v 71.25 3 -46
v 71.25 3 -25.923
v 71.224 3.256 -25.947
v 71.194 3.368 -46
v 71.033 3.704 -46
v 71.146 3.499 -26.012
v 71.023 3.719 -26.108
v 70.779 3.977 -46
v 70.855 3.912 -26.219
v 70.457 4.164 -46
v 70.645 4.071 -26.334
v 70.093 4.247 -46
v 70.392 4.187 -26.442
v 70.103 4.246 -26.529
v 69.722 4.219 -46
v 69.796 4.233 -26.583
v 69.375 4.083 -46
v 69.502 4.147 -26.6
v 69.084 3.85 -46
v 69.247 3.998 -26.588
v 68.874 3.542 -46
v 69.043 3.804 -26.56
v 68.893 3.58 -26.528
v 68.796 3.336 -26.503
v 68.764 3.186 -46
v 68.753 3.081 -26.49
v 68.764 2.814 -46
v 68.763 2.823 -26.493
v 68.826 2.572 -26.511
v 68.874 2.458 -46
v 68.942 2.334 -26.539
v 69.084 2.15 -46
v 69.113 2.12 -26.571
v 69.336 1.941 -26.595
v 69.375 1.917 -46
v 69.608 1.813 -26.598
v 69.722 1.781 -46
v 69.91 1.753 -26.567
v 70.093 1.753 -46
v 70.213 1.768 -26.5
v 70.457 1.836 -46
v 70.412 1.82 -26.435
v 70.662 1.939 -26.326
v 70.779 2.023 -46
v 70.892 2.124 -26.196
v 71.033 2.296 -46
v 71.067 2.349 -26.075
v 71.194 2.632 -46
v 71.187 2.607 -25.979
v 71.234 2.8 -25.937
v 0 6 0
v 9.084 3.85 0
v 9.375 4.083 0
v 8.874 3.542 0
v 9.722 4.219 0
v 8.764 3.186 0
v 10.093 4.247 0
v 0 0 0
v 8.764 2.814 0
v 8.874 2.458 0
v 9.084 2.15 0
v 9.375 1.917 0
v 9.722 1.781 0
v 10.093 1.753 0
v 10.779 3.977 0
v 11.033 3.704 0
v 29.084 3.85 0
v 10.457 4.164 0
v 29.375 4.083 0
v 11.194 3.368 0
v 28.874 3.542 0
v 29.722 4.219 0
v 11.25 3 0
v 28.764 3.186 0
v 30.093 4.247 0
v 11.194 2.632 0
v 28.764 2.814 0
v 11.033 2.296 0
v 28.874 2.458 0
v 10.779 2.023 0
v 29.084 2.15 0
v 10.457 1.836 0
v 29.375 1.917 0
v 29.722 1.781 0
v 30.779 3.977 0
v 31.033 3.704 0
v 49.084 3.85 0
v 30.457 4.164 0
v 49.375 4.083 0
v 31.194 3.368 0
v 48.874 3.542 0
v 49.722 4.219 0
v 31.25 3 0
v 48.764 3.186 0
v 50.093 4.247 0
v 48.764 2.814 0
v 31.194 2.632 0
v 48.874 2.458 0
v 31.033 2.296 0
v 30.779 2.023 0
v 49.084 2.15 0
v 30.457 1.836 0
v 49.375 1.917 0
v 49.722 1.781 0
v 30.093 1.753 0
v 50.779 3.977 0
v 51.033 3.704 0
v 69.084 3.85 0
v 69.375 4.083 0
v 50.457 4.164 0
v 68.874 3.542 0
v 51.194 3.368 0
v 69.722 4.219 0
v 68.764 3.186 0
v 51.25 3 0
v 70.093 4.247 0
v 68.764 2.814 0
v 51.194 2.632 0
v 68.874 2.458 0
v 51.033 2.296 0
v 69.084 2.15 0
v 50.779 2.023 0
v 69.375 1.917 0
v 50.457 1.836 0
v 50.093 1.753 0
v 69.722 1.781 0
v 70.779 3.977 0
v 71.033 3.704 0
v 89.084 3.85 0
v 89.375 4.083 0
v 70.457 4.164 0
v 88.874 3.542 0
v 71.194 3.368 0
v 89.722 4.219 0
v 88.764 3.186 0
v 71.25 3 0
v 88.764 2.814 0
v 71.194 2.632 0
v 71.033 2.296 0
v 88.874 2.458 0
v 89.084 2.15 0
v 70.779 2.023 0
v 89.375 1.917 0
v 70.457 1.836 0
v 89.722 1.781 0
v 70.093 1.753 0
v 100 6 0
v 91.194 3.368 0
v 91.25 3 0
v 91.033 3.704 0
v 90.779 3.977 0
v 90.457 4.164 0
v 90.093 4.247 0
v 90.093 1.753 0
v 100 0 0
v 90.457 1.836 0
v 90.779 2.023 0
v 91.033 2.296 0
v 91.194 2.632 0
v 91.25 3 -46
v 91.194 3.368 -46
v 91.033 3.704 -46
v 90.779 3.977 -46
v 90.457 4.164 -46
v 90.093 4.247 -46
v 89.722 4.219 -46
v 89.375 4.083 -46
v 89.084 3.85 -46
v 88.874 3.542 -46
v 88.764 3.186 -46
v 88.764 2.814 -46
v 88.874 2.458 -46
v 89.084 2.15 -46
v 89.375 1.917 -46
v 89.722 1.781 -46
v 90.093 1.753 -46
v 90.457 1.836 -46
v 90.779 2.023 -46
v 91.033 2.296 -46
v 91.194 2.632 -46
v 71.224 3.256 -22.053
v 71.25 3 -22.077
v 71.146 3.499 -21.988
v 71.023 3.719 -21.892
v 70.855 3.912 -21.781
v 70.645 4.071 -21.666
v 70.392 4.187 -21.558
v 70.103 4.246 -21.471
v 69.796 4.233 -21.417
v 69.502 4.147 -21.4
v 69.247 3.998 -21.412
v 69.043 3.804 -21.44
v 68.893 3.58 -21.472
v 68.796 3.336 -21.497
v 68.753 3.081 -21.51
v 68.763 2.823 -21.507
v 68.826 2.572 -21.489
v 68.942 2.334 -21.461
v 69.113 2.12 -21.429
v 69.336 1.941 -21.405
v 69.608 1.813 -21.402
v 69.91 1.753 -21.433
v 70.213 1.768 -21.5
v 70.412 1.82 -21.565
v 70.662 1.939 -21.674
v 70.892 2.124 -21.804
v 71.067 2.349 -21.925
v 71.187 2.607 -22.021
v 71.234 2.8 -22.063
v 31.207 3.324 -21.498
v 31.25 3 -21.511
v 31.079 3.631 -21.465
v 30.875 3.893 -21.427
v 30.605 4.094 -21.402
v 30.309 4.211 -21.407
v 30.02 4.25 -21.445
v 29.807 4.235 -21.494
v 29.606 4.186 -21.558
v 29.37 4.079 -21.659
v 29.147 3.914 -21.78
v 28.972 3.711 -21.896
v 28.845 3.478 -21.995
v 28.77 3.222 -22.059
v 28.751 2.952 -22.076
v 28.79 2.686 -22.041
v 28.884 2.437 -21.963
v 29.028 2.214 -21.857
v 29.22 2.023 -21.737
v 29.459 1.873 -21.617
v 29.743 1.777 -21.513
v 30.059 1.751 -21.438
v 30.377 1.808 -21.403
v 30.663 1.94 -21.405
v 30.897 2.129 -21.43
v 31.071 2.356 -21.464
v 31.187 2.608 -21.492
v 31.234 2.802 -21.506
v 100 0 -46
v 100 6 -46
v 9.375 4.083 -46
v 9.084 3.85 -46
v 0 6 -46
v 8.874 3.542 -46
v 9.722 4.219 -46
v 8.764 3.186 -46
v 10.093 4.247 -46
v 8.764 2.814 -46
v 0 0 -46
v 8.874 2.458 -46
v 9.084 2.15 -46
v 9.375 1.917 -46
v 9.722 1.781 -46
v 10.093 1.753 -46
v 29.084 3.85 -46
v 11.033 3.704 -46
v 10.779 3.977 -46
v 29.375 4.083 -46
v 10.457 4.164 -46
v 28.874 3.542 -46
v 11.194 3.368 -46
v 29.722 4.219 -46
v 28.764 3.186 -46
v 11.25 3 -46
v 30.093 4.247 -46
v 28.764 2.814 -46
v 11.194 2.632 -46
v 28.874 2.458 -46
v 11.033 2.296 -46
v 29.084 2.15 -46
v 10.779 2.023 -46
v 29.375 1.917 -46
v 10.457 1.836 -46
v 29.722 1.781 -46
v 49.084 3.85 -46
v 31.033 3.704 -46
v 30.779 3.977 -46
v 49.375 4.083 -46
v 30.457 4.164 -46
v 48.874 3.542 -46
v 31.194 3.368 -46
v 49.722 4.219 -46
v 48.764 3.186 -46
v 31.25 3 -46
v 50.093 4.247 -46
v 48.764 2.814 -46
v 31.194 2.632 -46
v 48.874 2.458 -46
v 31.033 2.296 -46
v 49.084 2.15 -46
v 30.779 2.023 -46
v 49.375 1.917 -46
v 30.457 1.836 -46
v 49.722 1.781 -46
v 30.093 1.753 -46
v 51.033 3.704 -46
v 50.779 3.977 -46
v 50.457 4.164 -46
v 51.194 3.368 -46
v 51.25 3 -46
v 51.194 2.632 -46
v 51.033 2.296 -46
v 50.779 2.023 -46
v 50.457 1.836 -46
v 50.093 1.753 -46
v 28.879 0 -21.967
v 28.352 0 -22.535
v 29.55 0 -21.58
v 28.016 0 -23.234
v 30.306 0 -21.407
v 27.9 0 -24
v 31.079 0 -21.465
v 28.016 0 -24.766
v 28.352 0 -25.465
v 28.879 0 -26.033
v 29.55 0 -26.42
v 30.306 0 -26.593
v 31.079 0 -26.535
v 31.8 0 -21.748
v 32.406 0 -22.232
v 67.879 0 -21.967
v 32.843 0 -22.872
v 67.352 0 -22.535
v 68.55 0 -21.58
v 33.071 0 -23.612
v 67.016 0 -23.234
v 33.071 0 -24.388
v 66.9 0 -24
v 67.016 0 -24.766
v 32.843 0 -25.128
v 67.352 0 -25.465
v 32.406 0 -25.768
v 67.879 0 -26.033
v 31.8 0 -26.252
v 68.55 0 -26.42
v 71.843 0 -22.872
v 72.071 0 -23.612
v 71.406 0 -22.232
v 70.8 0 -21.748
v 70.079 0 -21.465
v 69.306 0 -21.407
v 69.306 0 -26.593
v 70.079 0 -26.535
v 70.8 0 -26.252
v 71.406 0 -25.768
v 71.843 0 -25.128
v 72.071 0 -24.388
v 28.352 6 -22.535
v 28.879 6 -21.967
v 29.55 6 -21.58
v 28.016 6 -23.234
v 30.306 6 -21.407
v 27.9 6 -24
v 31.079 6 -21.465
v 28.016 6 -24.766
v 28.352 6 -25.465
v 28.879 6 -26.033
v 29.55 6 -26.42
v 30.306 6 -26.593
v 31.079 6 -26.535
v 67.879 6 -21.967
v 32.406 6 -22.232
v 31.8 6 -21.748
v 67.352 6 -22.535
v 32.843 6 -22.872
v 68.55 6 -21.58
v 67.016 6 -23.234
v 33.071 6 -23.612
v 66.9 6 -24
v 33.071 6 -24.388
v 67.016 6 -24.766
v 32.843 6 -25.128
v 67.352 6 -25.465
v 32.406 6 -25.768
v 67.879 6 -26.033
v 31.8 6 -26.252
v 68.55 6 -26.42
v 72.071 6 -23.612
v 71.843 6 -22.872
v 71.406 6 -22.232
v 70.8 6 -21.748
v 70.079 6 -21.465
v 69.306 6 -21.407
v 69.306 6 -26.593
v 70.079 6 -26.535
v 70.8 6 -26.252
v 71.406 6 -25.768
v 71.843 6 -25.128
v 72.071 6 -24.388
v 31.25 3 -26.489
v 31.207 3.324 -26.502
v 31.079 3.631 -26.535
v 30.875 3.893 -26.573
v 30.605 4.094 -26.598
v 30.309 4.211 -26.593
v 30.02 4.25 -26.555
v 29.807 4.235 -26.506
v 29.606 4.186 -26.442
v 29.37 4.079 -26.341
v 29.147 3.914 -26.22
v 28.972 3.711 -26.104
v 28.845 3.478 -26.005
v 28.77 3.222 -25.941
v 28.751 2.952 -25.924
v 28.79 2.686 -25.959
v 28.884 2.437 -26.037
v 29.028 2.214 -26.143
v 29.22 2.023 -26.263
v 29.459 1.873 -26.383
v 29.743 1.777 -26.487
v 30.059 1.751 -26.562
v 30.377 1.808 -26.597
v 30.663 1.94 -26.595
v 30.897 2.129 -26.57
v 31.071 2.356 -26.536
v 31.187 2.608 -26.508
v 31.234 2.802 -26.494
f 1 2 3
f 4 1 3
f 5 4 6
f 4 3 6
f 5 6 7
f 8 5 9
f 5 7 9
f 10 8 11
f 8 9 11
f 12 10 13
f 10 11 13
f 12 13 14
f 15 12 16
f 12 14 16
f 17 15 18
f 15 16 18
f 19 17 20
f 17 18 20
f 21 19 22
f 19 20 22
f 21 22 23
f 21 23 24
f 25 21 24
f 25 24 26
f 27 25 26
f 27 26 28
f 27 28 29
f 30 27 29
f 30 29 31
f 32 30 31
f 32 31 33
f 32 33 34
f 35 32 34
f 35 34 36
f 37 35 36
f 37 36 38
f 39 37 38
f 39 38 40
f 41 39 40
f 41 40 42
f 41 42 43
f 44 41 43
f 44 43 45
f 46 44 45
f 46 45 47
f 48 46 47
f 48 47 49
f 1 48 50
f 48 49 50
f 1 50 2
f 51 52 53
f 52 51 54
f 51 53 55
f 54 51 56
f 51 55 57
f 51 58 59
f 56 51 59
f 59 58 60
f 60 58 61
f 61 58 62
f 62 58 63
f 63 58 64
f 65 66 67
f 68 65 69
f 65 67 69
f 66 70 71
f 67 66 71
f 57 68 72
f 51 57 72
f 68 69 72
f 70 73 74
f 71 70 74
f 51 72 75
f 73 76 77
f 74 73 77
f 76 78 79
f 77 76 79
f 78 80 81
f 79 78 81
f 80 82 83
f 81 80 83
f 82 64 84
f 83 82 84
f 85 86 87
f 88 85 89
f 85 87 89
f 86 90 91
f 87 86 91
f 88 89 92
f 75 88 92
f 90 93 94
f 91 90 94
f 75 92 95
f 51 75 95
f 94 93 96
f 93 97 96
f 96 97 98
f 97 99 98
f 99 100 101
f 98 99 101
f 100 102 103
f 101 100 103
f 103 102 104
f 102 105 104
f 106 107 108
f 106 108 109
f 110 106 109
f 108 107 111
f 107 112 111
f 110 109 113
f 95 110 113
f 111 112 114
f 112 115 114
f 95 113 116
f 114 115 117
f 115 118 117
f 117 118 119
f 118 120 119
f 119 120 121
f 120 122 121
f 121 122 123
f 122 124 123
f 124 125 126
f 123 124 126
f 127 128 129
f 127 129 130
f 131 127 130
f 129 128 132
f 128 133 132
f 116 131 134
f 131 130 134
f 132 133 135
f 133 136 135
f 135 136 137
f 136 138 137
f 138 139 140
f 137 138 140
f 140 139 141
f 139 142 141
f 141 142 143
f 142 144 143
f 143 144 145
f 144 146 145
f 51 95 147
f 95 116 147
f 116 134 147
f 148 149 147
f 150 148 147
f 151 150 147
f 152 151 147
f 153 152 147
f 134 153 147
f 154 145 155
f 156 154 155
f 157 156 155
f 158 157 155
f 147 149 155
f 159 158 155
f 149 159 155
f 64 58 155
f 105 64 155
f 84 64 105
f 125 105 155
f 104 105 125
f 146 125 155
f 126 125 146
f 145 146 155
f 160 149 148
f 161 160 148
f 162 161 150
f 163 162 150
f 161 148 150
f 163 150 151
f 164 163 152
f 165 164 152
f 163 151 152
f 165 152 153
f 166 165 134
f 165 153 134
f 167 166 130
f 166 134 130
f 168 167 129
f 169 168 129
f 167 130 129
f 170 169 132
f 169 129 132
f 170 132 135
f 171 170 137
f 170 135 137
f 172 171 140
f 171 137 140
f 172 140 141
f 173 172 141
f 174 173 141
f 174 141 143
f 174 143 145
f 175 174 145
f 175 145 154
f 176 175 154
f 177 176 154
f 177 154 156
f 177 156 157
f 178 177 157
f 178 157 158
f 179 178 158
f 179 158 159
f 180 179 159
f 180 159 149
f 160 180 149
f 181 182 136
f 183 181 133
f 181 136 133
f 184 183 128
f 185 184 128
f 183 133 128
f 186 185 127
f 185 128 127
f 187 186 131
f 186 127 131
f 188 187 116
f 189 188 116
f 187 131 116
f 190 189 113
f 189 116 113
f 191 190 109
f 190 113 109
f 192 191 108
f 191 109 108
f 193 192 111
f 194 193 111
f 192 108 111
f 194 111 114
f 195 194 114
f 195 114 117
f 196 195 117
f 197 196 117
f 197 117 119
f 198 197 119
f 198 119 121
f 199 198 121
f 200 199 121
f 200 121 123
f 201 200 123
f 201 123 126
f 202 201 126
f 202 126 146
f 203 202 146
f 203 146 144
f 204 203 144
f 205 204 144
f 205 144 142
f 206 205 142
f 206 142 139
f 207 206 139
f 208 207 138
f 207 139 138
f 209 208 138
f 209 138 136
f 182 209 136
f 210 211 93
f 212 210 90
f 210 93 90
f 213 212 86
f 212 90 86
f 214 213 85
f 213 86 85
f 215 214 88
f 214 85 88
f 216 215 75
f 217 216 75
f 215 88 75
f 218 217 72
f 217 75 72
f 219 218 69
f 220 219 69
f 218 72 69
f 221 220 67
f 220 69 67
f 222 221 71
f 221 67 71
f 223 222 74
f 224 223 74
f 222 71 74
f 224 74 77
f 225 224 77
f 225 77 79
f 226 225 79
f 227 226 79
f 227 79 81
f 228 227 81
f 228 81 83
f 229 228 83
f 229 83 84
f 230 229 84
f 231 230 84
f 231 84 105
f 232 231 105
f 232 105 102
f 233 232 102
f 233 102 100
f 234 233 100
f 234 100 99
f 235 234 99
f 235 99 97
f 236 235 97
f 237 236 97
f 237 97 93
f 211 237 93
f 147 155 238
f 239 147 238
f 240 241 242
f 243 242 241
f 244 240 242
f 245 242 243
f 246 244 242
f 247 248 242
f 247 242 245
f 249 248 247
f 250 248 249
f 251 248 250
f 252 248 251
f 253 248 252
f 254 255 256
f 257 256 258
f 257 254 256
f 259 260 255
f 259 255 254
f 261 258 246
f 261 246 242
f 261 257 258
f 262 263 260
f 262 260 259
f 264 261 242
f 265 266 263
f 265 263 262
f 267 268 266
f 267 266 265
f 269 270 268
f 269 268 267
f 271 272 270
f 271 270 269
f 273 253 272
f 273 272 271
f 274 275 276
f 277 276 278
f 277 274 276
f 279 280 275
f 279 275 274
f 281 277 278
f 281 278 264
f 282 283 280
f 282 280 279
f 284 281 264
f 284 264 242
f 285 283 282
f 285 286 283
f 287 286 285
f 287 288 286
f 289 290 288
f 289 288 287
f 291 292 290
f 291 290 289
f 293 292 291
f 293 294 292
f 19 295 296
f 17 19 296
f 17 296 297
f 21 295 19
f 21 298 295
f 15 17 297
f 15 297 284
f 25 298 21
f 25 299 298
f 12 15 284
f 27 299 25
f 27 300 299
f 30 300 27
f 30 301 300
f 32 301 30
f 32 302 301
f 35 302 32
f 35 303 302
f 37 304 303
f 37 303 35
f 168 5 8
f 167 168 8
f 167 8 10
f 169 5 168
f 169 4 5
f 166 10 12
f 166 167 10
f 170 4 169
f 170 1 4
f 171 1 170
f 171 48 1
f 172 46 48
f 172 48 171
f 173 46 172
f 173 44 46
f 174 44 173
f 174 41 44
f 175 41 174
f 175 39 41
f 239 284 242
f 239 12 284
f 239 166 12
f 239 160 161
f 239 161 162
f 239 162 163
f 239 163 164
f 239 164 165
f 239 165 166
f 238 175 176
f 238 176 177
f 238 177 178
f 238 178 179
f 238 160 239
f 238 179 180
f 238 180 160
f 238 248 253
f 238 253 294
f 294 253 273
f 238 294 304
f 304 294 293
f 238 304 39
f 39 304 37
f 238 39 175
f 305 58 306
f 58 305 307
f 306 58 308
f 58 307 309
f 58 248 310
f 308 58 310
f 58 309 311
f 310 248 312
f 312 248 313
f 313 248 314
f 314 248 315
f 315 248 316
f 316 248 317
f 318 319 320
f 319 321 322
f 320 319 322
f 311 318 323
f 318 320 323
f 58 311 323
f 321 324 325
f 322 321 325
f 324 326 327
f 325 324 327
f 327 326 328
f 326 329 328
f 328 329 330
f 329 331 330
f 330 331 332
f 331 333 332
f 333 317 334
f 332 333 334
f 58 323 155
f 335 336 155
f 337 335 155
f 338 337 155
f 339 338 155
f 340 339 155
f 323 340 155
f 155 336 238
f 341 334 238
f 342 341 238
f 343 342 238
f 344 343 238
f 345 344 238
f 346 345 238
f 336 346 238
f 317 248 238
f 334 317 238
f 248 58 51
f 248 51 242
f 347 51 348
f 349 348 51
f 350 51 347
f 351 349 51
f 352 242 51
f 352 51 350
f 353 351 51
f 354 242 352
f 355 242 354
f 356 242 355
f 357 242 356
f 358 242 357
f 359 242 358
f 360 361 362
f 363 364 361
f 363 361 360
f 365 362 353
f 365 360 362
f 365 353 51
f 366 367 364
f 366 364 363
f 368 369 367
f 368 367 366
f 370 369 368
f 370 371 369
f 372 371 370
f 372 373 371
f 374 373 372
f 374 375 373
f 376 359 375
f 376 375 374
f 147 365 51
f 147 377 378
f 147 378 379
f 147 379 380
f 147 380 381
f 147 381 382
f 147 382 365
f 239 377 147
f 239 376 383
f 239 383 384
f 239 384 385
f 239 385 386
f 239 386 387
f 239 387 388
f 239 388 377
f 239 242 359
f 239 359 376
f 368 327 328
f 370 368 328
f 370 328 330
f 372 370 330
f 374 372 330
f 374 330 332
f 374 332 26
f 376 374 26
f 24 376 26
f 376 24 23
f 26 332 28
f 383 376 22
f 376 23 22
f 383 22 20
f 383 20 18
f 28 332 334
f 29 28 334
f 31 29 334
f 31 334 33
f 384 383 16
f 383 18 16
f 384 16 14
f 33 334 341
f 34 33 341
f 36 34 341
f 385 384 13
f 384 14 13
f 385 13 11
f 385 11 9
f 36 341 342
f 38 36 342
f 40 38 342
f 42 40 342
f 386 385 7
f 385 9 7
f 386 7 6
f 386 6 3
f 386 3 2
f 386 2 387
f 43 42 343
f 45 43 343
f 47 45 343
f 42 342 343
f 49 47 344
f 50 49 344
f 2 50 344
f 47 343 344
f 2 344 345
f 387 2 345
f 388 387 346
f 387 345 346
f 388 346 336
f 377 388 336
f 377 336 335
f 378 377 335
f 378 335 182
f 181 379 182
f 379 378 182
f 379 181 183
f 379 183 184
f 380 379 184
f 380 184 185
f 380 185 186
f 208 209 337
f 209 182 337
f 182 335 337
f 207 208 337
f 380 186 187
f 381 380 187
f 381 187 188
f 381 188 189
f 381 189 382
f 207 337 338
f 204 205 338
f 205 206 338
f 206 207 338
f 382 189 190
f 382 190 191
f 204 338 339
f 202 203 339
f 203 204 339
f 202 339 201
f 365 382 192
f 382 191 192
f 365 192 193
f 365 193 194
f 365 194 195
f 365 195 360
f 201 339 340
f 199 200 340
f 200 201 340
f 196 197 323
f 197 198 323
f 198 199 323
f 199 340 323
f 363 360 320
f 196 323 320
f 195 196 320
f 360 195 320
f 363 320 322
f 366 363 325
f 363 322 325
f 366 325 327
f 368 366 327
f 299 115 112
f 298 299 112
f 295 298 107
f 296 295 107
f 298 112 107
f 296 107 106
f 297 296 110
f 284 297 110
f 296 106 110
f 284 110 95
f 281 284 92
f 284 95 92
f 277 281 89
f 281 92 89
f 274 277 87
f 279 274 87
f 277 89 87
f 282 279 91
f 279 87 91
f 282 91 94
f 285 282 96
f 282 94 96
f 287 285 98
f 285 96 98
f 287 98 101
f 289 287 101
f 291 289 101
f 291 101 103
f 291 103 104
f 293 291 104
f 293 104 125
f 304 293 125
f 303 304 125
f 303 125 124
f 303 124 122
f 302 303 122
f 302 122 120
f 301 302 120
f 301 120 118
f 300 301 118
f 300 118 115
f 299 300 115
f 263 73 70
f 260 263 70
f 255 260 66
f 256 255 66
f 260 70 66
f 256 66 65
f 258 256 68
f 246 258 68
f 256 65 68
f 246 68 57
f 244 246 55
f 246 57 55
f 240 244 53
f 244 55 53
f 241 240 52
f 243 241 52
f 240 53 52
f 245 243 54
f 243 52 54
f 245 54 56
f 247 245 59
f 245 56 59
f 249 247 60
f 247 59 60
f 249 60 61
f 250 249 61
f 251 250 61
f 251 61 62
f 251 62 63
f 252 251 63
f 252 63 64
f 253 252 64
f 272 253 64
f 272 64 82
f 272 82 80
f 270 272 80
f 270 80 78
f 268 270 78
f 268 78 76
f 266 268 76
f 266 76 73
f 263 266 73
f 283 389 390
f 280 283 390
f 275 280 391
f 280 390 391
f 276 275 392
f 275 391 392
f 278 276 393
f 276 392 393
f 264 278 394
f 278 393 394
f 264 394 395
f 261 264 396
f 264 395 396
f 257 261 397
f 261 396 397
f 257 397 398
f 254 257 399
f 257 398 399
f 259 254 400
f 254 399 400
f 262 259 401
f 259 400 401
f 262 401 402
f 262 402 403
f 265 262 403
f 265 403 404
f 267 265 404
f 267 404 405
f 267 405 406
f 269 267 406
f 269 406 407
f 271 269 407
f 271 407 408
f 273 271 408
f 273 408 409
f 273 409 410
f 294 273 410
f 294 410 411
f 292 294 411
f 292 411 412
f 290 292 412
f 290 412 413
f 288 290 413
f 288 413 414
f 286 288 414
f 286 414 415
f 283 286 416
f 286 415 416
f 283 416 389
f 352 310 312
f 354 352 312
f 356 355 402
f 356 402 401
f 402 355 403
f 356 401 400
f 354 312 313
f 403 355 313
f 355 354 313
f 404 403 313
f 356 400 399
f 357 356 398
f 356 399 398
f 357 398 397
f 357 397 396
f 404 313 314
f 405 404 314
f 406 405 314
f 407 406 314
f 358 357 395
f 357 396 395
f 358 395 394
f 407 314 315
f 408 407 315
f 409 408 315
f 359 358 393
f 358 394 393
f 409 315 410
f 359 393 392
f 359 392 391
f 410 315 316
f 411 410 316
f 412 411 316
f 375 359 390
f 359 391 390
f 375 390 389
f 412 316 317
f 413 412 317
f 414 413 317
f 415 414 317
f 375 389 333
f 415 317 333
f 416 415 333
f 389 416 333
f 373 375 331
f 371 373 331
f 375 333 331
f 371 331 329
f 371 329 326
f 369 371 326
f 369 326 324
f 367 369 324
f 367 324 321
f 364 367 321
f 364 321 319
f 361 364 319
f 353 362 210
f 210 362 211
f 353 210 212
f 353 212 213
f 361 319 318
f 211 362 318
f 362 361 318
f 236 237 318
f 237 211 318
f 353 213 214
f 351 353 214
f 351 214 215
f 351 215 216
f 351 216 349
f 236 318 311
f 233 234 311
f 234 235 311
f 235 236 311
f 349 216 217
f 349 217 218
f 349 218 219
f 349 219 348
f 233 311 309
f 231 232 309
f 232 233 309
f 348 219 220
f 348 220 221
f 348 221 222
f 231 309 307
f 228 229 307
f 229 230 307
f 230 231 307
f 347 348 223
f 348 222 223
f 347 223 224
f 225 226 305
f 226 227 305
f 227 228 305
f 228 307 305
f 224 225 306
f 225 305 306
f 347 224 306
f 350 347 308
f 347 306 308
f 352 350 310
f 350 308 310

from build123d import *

# Parameters (mm, degrees)
SKETCH1_W                    = 100
SKETCH1_H                    = 46
BOSS_EXTRUDE1_DEPTH          = 6
TAP_DRILL_FOR_M3_TAP1_D      = 2.5
TAP_DRILL_FOR_M5_HELICOIL1_D = 5.2


with BuildPart() as part:
    # Sketch1 → Boss-Extrude1 (new body)
    with BuildSketch(Plane(origin=(0, 0, 0), x_dir=(1, 0, 0), z_dir=(0, 1, 0))):
        with Locations((50, 23)):
            Rectangle(SKETCH1_W, SKETCH1_H)
    extrude(amount=BOSS_EXTRUDE1_DEPTH)

    # Tap Drill for M3 Tap1 (through all)
    with Locations(Plane(origin=(0, 0, -46), x_dir=(-1, 0, 0), z_dir=(0, 0, -1))):
        with Locations((-90, 3), (-70, 3), (-50, 3), (-30, 3), (-10, 3)):
            Hole(TAP_DRILL_FOR_M3_TAP1_D / 2)

    # Tap Drill for M5 Helicoil1 (through all)
    with Locations(Plane(origin=(0, 6, 0), x_dir=(1, 0, 0), z_dir=(0, 1, 0))):
        with Locations((30.5, 24), (69.5, 24)):
            Hole(TAP_DRILL_FOR_M5_HELICOIL1_D / 2)


solid = part.part
